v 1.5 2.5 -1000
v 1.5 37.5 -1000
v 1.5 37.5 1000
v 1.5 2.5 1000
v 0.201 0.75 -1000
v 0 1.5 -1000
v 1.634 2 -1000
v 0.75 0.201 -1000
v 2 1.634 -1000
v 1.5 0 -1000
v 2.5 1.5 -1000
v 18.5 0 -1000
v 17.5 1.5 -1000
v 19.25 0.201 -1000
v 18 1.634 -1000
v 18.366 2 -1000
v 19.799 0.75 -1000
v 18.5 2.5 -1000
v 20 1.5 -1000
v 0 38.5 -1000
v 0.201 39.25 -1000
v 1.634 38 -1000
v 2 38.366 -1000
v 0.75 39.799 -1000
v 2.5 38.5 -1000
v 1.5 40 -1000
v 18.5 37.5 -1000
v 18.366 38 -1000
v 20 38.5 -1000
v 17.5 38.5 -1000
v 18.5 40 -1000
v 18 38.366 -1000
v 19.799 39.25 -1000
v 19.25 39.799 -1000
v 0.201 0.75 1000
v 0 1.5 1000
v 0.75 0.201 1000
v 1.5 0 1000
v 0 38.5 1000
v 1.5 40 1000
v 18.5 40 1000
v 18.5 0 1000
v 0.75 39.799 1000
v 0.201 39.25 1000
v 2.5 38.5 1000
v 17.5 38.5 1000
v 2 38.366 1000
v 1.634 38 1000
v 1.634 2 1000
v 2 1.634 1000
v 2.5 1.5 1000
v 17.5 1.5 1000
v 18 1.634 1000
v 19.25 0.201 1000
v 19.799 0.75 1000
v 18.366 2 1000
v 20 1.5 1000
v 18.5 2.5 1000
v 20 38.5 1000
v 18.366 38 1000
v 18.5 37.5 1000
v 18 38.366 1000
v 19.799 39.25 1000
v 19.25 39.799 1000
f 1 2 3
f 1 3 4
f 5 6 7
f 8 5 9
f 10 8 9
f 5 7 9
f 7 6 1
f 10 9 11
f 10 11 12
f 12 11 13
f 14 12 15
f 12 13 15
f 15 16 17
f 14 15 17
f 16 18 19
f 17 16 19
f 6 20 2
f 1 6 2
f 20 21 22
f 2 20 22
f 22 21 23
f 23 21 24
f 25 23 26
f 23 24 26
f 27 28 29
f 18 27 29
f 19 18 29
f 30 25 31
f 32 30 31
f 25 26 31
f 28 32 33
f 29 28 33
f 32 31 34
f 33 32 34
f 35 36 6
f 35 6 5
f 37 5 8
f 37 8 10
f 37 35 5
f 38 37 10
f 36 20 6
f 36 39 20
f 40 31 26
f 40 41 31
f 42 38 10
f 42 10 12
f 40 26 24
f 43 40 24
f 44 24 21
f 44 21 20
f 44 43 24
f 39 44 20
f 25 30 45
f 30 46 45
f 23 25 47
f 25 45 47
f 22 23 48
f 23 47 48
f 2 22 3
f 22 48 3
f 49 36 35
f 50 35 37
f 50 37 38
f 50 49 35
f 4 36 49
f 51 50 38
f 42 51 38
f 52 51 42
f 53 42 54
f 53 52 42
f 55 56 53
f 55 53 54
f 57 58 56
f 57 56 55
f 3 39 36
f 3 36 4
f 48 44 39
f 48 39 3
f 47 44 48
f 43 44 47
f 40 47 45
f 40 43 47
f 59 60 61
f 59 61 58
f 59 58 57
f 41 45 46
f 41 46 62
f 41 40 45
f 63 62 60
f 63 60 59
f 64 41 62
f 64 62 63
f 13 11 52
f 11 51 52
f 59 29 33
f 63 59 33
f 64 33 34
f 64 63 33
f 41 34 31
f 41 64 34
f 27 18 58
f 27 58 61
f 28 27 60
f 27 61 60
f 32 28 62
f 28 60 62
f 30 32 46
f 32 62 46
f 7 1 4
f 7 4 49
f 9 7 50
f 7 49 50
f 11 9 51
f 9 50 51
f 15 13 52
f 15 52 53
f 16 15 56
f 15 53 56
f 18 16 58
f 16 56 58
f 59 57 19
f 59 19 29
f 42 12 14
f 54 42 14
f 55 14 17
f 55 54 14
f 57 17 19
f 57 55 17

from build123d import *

# Parameters (mm, degrees)
EXTRUDE_1_DEPTH = 1000


with BuildPart() as part:
    # Эскиз1 → Бобышка-Вытянуть1 (new body)
    with BuildSketch(Plane.XY):
        with BuildLine():
            Line((0, 38.5), (0, 1.5))
            ThreePointArc((0, 1.5), (0.439339828, 0.439339828), (1.5, 0))
            Line((1.5, 0), (18.5, 0))
            ThreePointArc((18.5, 0), (19.560660172, 0.439339828), (20, 1.5))
            Line((20, 1.5), (20, 38.5))
            ThreePointArc((20, 38.5), (19.560660172, 39.560660172), (18.5, 40))
            Line((18.5, 40), (1.5, 40))
            ThreePointArc((1.5, 40), (0.439339828, 39.560660172), (0, 38.5))
        make_face()
        with BuildLine():
            Line((1.5, 37.5), (1.5, 2.5))
            ThreePointArc((1.5, 2.5), (1.792893219, 1.792893219), (2.5, 1.5))
            Line((2.5, 1.5), (17.5, 1.5))
            ThreePointArc((17.5, 1.5), (18.207106781, 1.792893219), (18.5, 2.5))
            Line((18.5, 2.5), (18.5, 37.5))
            ThreePointArc((18.5, 37.5), (18.207106781, 38.207106781), (17.5, 38.5))
            Line((17.5, 38.5), (2.5, 38.5))
            ThreePointArc((2.5, 38.5), (1.792893219, 38.207106781), (1.5, 37.5))
        make_face(mode=Mode.SUBTRACT)
    extrude_1 = extrude(amount=EXTRUDE_1_DEPTH)

    # Зеркальное отражение1: Бобышка-Вытянуть1 across plane
    add(extrude_1.mirror(Plane(origin=(18.5, 38.5, 0), x_dir=(1, 0, 0), z_dir=(0, 0, -1))))


solid = part.part
